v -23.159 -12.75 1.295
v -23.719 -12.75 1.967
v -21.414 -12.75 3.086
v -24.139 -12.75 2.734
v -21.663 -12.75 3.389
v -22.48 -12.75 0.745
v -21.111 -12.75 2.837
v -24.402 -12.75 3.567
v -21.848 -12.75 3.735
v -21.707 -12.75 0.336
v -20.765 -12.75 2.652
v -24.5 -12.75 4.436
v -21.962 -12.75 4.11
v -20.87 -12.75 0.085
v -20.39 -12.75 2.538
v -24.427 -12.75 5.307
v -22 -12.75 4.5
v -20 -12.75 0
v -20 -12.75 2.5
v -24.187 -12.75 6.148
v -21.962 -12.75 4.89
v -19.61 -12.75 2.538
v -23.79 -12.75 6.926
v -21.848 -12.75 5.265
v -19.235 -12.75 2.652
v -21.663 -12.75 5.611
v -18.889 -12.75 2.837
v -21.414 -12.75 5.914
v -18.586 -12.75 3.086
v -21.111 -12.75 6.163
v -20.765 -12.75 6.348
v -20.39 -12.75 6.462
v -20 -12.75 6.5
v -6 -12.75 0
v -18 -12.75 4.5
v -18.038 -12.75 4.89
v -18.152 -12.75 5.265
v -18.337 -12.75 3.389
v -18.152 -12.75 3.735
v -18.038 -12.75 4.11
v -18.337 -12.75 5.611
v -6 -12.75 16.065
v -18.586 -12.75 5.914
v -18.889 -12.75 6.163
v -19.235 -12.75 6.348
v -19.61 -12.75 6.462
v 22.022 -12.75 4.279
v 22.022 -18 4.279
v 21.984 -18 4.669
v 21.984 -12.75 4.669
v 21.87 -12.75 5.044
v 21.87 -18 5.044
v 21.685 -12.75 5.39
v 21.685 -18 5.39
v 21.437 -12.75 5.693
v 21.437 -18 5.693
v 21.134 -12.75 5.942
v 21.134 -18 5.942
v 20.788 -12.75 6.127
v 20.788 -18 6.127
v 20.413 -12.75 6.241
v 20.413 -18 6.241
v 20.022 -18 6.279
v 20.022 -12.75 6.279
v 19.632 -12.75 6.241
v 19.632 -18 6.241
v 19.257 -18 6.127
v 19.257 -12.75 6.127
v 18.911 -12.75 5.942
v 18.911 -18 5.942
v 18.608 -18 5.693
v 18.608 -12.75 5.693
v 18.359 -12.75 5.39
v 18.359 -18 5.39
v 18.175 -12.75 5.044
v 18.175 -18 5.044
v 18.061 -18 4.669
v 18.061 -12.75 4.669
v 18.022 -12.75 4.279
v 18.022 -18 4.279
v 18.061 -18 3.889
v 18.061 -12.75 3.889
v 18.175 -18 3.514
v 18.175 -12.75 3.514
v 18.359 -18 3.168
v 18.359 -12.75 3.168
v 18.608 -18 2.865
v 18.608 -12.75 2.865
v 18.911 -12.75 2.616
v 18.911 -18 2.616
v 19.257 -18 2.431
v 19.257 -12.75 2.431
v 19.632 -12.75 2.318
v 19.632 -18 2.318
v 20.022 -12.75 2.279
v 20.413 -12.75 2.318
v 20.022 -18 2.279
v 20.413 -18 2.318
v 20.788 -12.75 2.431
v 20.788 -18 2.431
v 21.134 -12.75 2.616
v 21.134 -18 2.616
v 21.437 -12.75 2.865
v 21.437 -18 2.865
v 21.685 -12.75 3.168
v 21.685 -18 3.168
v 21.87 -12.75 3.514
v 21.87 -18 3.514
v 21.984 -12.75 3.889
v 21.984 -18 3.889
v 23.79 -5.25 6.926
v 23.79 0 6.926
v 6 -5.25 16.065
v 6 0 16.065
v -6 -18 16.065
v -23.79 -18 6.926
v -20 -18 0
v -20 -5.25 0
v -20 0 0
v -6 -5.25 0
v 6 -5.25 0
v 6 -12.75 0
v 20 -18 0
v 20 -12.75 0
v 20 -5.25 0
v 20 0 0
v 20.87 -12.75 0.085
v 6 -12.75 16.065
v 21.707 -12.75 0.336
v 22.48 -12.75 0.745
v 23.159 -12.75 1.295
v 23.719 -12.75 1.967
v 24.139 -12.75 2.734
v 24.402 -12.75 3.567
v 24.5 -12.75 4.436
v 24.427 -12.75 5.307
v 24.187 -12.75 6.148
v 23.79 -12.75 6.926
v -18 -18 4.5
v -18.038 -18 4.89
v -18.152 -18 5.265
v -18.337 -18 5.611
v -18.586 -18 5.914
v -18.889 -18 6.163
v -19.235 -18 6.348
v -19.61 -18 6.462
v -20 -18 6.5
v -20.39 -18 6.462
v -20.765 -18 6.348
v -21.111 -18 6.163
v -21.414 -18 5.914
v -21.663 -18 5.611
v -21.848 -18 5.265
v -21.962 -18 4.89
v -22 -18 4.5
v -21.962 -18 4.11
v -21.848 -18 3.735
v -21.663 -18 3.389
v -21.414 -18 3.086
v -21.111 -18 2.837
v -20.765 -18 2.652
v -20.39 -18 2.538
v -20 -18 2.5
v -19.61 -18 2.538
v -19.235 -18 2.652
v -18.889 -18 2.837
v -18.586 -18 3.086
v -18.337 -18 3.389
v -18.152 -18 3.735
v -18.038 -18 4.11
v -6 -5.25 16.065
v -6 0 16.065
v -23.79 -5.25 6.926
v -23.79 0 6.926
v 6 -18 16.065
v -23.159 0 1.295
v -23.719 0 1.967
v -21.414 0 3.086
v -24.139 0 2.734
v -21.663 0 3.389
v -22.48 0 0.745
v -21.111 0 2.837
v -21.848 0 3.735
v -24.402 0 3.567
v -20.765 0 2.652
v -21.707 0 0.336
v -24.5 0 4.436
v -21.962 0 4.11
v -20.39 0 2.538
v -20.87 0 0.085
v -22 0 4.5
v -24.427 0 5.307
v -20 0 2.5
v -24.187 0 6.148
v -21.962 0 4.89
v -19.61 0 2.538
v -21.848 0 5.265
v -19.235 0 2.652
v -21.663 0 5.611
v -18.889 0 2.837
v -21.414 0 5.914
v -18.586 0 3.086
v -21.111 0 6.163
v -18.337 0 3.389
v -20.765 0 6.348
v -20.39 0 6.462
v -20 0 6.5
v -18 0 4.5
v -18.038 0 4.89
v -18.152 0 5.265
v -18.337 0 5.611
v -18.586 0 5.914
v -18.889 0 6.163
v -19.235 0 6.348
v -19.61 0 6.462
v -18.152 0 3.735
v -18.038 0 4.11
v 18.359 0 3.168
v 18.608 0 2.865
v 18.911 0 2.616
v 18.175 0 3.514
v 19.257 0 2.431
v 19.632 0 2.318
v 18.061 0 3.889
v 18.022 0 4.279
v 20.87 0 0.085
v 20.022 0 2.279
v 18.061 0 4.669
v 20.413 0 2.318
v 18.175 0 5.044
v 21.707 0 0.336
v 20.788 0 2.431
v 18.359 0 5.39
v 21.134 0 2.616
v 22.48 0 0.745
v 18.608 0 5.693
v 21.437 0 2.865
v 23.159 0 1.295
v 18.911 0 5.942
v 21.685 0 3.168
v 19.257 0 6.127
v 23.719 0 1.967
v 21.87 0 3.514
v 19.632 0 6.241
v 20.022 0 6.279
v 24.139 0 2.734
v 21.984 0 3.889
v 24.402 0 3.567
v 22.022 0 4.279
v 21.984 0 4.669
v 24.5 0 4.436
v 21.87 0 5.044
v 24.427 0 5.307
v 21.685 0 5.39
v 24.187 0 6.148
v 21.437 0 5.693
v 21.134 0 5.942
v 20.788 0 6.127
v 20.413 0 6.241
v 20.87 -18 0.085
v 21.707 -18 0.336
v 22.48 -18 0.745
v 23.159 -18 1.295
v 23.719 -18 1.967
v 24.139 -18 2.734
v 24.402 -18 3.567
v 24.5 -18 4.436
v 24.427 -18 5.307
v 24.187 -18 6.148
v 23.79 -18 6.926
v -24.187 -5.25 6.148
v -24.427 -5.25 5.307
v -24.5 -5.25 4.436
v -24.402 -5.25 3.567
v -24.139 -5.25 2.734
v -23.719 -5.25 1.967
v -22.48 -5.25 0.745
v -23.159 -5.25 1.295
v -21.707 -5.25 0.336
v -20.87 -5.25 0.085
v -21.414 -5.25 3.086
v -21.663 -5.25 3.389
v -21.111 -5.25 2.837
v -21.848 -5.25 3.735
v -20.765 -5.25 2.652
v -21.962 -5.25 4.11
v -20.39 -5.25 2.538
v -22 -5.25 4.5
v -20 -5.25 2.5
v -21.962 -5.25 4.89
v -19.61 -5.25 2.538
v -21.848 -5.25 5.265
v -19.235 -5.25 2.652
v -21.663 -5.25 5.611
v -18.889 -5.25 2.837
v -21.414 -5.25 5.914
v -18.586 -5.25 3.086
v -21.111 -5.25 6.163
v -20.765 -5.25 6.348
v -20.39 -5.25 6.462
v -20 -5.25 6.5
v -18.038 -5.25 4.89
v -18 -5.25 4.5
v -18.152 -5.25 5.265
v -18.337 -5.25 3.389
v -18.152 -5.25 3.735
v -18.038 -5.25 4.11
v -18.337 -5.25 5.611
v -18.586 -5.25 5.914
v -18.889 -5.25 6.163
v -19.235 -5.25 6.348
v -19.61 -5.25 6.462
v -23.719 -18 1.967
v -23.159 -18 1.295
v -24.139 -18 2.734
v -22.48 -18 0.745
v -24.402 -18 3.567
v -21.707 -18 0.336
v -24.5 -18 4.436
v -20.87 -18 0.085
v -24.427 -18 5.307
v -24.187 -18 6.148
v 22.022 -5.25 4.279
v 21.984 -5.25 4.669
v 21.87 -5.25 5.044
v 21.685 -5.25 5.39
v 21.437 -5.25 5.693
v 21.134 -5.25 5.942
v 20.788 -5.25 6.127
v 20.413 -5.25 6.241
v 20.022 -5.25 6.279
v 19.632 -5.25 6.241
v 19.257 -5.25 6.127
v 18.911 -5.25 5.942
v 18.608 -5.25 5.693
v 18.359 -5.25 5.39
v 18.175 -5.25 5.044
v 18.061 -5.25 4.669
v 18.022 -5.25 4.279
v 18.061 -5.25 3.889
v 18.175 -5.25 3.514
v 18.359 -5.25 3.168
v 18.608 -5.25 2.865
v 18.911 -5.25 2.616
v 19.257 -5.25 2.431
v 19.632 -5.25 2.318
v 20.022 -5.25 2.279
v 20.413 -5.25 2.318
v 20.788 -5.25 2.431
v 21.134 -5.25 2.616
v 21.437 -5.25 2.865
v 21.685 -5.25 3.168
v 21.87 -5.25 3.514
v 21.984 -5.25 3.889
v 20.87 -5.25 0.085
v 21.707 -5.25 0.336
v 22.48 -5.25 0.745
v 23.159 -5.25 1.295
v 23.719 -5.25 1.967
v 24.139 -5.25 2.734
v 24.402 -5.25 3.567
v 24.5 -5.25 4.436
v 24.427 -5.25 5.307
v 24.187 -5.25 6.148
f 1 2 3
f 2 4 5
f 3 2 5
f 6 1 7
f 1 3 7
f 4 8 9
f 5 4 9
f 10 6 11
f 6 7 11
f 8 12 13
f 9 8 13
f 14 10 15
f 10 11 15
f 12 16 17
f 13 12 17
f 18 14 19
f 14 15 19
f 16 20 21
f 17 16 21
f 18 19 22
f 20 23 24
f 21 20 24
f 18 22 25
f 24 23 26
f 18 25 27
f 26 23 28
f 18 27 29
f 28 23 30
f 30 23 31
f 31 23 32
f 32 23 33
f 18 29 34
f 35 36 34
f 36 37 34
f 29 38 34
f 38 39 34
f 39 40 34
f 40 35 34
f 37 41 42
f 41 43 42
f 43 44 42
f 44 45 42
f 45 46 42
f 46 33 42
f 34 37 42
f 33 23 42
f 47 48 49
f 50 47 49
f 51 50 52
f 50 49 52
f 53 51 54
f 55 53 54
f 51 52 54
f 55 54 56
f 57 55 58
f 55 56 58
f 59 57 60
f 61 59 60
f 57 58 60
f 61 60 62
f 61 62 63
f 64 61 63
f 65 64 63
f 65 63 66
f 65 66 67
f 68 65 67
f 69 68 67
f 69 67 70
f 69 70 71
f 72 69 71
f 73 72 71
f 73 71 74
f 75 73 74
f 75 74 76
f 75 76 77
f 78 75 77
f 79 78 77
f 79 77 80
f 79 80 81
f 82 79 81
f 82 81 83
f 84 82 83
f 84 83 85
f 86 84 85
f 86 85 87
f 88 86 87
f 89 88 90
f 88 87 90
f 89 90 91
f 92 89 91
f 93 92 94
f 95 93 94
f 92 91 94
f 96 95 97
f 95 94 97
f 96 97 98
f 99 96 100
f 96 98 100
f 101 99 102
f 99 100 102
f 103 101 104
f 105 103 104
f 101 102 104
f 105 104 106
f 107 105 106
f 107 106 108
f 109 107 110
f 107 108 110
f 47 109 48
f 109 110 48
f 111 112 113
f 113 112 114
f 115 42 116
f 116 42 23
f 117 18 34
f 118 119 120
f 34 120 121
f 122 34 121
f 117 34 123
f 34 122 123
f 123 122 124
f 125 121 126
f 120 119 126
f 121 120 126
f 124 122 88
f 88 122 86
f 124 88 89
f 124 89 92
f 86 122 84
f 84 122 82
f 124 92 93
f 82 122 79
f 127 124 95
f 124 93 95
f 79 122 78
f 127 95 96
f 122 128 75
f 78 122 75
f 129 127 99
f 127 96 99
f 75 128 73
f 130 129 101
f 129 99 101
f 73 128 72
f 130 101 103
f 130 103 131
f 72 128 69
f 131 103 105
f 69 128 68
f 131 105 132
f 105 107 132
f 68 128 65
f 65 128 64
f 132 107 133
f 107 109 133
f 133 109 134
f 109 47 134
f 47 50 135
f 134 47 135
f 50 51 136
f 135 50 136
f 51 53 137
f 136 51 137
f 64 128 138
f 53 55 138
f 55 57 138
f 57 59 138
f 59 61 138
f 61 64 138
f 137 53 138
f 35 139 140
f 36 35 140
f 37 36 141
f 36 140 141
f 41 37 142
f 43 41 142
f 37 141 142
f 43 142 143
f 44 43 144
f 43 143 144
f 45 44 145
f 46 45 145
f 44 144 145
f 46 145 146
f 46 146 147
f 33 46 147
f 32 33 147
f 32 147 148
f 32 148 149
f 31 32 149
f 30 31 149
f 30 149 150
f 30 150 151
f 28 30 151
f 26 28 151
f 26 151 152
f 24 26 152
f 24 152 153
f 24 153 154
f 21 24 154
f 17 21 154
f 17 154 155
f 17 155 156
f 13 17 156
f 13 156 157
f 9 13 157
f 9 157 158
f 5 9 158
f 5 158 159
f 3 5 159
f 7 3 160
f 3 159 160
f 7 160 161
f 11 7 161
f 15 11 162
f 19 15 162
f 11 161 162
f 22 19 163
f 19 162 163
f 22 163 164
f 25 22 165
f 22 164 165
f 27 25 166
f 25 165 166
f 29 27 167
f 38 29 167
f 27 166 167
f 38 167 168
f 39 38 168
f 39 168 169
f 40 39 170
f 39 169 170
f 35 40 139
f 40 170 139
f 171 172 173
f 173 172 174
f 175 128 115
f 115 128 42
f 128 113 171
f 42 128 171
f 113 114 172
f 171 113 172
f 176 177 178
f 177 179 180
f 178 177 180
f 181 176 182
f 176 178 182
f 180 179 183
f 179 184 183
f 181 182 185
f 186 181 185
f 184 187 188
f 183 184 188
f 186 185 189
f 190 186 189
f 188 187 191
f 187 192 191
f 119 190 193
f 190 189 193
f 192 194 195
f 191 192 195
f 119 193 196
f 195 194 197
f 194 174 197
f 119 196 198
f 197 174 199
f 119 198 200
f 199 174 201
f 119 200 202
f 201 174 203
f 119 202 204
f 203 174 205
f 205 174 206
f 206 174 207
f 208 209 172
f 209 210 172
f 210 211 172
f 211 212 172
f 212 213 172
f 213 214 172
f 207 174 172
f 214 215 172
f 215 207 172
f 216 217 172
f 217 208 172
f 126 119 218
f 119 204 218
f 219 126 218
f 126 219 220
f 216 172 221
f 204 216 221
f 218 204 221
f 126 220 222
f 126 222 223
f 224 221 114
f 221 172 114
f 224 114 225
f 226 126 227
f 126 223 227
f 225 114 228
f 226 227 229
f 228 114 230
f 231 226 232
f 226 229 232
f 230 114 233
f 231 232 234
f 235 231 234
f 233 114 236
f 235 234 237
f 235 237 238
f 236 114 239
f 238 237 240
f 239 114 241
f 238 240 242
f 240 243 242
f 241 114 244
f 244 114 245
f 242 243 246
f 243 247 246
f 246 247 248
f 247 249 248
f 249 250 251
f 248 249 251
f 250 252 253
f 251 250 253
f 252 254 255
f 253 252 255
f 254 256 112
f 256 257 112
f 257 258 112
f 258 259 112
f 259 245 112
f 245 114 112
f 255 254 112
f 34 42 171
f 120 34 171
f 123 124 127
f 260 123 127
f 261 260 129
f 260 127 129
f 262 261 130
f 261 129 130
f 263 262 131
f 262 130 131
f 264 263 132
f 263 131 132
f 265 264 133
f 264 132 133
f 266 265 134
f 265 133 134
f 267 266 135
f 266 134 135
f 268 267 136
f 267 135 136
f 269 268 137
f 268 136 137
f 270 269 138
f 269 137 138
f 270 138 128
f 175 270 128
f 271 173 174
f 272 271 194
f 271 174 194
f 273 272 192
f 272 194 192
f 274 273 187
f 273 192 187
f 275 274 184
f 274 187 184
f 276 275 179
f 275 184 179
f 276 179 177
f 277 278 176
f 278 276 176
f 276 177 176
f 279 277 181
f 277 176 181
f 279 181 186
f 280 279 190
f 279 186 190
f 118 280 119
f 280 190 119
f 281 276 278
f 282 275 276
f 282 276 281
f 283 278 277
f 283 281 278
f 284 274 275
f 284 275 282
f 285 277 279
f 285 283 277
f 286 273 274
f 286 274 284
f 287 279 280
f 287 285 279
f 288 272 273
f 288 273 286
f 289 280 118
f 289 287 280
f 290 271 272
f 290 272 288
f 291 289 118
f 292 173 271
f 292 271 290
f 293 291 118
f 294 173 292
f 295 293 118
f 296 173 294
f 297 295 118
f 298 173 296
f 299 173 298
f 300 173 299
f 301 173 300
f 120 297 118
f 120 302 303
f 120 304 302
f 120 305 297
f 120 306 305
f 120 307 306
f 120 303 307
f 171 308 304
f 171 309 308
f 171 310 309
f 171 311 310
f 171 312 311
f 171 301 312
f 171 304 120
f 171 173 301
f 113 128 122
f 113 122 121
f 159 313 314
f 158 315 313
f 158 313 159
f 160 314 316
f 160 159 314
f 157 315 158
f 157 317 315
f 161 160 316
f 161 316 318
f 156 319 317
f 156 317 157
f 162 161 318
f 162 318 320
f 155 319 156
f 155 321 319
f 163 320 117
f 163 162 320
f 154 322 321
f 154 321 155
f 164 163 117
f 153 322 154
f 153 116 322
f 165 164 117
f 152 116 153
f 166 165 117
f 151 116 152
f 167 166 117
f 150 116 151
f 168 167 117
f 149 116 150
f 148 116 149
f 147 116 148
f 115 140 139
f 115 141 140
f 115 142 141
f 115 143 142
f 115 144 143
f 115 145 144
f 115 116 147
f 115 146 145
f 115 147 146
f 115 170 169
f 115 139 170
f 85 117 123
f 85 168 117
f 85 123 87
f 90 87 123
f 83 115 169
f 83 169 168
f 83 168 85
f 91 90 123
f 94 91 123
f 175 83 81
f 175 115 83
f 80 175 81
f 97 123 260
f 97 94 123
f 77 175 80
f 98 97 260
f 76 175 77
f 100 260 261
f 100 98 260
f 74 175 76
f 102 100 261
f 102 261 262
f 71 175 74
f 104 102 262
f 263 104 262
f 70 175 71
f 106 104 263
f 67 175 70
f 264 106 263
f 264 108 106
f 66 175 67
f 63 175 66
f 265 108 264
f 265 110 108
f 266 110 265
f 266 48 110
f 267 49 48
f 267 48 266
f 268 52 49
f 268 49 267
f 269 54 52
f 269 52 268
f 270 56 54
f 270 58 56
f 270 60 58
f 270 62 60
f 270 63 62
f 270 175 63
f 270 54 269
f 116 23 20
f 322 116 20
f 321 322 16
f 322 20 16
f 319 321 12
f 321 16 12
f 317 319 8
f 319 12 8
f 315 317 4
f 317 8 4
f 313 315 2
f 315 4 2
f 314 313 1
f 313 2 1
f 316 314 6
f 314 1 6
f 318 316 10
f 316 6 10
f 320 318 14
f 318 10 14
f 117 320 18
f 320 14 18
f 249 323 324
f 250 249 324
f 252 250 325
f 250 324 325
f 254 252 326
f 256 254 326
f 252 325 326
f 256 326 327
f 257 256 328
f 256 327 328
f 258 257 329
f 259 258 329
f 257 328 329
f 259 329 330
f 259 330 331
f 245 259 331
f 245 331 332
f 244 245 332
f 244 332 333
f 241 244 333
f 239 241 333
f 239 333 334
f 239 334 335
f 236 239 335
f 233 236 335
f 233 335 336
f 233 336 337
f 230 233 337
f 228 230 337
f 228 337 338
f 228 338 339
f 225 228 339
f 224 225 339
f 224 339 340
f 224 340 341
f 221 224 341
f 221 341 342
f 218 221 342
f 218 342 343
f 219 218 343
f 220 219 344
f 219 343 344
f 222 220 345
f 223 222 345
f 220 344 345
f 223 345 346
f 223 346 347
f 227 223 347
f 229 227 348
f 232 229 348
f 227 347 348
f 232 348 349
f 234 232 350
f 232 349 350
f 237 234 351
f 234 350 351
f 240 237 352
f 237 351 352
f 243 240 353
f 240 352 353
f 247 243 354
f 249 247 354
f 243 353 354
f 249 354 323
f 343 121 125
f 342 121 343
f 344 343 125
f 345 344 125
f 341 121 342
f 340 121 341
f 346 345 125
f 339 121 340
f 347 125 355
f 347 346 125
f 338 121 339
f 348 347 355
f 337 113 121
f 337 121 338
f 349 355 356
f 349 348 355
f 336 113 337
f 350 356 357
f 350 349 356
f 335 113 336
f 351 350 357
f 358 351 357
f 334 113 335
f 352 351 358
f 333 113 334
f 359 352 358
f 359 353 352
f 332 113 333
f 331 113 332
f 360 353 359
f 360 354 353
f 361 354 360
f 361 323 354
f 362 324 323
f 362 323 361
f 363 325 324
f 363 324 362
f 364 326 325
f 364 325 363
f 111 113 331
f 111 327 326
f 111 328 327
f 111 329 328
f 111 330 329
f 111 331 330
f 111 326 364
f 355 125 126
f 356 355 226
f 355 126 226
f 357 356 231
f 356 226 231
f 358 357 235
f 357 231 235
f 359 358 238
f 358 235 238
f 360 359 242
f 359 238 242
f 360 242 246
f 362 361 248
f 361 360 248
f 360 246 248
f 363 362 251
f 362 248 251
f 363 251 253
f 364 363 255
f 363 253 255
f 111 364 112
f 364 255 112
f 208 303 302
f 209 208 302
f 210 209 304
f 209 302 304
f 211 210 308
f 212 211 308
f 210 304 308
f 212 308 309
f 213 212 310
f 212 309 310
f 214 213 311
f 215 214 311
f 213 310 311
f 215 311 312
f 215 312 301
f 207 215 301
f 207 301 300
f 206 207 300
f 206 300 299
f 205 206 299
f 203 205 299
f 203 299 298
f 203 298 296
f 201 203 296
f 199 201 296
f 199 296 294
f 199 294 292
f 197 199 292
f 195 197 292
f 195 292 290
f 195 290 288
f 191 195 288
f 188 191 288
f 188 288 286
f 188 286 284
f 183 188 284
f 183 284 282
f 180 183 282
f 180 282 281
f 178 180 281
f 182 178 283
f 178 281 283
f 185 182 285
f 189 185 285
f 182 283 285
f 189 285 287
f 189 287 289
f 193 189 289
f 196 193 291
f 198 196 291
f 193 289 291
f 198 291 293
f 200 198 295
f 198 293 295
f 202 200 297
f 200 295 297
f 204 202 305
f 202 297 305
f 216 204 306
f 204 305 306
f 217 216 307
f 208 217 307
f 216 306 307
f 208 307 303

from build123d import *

# Parameters (mm, degrees)
F1_DEPTH = 18
F2_W     = 31.425511
F2_H     = 7.5
F3_DEPTH = 25
F4_R     = 2
F5_DEPTH = 25


with BuildPart() as f1:
    # F0 (on Front) → F1 (new body)
    with BuildSketch(Plane.XZ):
        with BuildLine():
            Line((-20, 0), (0, 0))
            Line((0, 0), (20, 0))
            ThreePointArc((20, 0), (23.947664, 2.33992), (23.789899, 6.926246))
            Line((23.789899, 6.926246), (6, 16.065147))
            Line((6, 16.065147), (-6, 16.065147))
            Line((-6, 16.065147), (-23.789899, 6.926246))
            ThreePointArc((-23.789899, 6.926246), (-23.947664, 2.33992), (-20, 0))
        make_face()
    extrude(amount=F1_DEPTH)

    # F2 (on face) → F3 (cut)
    with BuildSketch(Plane.XY.offset(16.065147)):
        with Locations((-21.712756, -9)):
            Rectangle(F2_W, F2_H)
        with Locations((21.712756, -9)):
            Rectangle(F2_W, F2_H)
    extrude(amount=-F3_DEPTH, mode=Mode.SUBTRACT)

    # F4 (on face) → F5 (cut)
    with BuildSketch(Plane.XZ.offset(18)):
        with Locations((-20, 4.5)):
            Circle(F4_R)
        with Locations((20.022377, 4.279106)):
            Circle(F4_R)
    extrude(amount=-F5_DEPTH, mode=Mode.SUBTRACT)


solid = f1.part
